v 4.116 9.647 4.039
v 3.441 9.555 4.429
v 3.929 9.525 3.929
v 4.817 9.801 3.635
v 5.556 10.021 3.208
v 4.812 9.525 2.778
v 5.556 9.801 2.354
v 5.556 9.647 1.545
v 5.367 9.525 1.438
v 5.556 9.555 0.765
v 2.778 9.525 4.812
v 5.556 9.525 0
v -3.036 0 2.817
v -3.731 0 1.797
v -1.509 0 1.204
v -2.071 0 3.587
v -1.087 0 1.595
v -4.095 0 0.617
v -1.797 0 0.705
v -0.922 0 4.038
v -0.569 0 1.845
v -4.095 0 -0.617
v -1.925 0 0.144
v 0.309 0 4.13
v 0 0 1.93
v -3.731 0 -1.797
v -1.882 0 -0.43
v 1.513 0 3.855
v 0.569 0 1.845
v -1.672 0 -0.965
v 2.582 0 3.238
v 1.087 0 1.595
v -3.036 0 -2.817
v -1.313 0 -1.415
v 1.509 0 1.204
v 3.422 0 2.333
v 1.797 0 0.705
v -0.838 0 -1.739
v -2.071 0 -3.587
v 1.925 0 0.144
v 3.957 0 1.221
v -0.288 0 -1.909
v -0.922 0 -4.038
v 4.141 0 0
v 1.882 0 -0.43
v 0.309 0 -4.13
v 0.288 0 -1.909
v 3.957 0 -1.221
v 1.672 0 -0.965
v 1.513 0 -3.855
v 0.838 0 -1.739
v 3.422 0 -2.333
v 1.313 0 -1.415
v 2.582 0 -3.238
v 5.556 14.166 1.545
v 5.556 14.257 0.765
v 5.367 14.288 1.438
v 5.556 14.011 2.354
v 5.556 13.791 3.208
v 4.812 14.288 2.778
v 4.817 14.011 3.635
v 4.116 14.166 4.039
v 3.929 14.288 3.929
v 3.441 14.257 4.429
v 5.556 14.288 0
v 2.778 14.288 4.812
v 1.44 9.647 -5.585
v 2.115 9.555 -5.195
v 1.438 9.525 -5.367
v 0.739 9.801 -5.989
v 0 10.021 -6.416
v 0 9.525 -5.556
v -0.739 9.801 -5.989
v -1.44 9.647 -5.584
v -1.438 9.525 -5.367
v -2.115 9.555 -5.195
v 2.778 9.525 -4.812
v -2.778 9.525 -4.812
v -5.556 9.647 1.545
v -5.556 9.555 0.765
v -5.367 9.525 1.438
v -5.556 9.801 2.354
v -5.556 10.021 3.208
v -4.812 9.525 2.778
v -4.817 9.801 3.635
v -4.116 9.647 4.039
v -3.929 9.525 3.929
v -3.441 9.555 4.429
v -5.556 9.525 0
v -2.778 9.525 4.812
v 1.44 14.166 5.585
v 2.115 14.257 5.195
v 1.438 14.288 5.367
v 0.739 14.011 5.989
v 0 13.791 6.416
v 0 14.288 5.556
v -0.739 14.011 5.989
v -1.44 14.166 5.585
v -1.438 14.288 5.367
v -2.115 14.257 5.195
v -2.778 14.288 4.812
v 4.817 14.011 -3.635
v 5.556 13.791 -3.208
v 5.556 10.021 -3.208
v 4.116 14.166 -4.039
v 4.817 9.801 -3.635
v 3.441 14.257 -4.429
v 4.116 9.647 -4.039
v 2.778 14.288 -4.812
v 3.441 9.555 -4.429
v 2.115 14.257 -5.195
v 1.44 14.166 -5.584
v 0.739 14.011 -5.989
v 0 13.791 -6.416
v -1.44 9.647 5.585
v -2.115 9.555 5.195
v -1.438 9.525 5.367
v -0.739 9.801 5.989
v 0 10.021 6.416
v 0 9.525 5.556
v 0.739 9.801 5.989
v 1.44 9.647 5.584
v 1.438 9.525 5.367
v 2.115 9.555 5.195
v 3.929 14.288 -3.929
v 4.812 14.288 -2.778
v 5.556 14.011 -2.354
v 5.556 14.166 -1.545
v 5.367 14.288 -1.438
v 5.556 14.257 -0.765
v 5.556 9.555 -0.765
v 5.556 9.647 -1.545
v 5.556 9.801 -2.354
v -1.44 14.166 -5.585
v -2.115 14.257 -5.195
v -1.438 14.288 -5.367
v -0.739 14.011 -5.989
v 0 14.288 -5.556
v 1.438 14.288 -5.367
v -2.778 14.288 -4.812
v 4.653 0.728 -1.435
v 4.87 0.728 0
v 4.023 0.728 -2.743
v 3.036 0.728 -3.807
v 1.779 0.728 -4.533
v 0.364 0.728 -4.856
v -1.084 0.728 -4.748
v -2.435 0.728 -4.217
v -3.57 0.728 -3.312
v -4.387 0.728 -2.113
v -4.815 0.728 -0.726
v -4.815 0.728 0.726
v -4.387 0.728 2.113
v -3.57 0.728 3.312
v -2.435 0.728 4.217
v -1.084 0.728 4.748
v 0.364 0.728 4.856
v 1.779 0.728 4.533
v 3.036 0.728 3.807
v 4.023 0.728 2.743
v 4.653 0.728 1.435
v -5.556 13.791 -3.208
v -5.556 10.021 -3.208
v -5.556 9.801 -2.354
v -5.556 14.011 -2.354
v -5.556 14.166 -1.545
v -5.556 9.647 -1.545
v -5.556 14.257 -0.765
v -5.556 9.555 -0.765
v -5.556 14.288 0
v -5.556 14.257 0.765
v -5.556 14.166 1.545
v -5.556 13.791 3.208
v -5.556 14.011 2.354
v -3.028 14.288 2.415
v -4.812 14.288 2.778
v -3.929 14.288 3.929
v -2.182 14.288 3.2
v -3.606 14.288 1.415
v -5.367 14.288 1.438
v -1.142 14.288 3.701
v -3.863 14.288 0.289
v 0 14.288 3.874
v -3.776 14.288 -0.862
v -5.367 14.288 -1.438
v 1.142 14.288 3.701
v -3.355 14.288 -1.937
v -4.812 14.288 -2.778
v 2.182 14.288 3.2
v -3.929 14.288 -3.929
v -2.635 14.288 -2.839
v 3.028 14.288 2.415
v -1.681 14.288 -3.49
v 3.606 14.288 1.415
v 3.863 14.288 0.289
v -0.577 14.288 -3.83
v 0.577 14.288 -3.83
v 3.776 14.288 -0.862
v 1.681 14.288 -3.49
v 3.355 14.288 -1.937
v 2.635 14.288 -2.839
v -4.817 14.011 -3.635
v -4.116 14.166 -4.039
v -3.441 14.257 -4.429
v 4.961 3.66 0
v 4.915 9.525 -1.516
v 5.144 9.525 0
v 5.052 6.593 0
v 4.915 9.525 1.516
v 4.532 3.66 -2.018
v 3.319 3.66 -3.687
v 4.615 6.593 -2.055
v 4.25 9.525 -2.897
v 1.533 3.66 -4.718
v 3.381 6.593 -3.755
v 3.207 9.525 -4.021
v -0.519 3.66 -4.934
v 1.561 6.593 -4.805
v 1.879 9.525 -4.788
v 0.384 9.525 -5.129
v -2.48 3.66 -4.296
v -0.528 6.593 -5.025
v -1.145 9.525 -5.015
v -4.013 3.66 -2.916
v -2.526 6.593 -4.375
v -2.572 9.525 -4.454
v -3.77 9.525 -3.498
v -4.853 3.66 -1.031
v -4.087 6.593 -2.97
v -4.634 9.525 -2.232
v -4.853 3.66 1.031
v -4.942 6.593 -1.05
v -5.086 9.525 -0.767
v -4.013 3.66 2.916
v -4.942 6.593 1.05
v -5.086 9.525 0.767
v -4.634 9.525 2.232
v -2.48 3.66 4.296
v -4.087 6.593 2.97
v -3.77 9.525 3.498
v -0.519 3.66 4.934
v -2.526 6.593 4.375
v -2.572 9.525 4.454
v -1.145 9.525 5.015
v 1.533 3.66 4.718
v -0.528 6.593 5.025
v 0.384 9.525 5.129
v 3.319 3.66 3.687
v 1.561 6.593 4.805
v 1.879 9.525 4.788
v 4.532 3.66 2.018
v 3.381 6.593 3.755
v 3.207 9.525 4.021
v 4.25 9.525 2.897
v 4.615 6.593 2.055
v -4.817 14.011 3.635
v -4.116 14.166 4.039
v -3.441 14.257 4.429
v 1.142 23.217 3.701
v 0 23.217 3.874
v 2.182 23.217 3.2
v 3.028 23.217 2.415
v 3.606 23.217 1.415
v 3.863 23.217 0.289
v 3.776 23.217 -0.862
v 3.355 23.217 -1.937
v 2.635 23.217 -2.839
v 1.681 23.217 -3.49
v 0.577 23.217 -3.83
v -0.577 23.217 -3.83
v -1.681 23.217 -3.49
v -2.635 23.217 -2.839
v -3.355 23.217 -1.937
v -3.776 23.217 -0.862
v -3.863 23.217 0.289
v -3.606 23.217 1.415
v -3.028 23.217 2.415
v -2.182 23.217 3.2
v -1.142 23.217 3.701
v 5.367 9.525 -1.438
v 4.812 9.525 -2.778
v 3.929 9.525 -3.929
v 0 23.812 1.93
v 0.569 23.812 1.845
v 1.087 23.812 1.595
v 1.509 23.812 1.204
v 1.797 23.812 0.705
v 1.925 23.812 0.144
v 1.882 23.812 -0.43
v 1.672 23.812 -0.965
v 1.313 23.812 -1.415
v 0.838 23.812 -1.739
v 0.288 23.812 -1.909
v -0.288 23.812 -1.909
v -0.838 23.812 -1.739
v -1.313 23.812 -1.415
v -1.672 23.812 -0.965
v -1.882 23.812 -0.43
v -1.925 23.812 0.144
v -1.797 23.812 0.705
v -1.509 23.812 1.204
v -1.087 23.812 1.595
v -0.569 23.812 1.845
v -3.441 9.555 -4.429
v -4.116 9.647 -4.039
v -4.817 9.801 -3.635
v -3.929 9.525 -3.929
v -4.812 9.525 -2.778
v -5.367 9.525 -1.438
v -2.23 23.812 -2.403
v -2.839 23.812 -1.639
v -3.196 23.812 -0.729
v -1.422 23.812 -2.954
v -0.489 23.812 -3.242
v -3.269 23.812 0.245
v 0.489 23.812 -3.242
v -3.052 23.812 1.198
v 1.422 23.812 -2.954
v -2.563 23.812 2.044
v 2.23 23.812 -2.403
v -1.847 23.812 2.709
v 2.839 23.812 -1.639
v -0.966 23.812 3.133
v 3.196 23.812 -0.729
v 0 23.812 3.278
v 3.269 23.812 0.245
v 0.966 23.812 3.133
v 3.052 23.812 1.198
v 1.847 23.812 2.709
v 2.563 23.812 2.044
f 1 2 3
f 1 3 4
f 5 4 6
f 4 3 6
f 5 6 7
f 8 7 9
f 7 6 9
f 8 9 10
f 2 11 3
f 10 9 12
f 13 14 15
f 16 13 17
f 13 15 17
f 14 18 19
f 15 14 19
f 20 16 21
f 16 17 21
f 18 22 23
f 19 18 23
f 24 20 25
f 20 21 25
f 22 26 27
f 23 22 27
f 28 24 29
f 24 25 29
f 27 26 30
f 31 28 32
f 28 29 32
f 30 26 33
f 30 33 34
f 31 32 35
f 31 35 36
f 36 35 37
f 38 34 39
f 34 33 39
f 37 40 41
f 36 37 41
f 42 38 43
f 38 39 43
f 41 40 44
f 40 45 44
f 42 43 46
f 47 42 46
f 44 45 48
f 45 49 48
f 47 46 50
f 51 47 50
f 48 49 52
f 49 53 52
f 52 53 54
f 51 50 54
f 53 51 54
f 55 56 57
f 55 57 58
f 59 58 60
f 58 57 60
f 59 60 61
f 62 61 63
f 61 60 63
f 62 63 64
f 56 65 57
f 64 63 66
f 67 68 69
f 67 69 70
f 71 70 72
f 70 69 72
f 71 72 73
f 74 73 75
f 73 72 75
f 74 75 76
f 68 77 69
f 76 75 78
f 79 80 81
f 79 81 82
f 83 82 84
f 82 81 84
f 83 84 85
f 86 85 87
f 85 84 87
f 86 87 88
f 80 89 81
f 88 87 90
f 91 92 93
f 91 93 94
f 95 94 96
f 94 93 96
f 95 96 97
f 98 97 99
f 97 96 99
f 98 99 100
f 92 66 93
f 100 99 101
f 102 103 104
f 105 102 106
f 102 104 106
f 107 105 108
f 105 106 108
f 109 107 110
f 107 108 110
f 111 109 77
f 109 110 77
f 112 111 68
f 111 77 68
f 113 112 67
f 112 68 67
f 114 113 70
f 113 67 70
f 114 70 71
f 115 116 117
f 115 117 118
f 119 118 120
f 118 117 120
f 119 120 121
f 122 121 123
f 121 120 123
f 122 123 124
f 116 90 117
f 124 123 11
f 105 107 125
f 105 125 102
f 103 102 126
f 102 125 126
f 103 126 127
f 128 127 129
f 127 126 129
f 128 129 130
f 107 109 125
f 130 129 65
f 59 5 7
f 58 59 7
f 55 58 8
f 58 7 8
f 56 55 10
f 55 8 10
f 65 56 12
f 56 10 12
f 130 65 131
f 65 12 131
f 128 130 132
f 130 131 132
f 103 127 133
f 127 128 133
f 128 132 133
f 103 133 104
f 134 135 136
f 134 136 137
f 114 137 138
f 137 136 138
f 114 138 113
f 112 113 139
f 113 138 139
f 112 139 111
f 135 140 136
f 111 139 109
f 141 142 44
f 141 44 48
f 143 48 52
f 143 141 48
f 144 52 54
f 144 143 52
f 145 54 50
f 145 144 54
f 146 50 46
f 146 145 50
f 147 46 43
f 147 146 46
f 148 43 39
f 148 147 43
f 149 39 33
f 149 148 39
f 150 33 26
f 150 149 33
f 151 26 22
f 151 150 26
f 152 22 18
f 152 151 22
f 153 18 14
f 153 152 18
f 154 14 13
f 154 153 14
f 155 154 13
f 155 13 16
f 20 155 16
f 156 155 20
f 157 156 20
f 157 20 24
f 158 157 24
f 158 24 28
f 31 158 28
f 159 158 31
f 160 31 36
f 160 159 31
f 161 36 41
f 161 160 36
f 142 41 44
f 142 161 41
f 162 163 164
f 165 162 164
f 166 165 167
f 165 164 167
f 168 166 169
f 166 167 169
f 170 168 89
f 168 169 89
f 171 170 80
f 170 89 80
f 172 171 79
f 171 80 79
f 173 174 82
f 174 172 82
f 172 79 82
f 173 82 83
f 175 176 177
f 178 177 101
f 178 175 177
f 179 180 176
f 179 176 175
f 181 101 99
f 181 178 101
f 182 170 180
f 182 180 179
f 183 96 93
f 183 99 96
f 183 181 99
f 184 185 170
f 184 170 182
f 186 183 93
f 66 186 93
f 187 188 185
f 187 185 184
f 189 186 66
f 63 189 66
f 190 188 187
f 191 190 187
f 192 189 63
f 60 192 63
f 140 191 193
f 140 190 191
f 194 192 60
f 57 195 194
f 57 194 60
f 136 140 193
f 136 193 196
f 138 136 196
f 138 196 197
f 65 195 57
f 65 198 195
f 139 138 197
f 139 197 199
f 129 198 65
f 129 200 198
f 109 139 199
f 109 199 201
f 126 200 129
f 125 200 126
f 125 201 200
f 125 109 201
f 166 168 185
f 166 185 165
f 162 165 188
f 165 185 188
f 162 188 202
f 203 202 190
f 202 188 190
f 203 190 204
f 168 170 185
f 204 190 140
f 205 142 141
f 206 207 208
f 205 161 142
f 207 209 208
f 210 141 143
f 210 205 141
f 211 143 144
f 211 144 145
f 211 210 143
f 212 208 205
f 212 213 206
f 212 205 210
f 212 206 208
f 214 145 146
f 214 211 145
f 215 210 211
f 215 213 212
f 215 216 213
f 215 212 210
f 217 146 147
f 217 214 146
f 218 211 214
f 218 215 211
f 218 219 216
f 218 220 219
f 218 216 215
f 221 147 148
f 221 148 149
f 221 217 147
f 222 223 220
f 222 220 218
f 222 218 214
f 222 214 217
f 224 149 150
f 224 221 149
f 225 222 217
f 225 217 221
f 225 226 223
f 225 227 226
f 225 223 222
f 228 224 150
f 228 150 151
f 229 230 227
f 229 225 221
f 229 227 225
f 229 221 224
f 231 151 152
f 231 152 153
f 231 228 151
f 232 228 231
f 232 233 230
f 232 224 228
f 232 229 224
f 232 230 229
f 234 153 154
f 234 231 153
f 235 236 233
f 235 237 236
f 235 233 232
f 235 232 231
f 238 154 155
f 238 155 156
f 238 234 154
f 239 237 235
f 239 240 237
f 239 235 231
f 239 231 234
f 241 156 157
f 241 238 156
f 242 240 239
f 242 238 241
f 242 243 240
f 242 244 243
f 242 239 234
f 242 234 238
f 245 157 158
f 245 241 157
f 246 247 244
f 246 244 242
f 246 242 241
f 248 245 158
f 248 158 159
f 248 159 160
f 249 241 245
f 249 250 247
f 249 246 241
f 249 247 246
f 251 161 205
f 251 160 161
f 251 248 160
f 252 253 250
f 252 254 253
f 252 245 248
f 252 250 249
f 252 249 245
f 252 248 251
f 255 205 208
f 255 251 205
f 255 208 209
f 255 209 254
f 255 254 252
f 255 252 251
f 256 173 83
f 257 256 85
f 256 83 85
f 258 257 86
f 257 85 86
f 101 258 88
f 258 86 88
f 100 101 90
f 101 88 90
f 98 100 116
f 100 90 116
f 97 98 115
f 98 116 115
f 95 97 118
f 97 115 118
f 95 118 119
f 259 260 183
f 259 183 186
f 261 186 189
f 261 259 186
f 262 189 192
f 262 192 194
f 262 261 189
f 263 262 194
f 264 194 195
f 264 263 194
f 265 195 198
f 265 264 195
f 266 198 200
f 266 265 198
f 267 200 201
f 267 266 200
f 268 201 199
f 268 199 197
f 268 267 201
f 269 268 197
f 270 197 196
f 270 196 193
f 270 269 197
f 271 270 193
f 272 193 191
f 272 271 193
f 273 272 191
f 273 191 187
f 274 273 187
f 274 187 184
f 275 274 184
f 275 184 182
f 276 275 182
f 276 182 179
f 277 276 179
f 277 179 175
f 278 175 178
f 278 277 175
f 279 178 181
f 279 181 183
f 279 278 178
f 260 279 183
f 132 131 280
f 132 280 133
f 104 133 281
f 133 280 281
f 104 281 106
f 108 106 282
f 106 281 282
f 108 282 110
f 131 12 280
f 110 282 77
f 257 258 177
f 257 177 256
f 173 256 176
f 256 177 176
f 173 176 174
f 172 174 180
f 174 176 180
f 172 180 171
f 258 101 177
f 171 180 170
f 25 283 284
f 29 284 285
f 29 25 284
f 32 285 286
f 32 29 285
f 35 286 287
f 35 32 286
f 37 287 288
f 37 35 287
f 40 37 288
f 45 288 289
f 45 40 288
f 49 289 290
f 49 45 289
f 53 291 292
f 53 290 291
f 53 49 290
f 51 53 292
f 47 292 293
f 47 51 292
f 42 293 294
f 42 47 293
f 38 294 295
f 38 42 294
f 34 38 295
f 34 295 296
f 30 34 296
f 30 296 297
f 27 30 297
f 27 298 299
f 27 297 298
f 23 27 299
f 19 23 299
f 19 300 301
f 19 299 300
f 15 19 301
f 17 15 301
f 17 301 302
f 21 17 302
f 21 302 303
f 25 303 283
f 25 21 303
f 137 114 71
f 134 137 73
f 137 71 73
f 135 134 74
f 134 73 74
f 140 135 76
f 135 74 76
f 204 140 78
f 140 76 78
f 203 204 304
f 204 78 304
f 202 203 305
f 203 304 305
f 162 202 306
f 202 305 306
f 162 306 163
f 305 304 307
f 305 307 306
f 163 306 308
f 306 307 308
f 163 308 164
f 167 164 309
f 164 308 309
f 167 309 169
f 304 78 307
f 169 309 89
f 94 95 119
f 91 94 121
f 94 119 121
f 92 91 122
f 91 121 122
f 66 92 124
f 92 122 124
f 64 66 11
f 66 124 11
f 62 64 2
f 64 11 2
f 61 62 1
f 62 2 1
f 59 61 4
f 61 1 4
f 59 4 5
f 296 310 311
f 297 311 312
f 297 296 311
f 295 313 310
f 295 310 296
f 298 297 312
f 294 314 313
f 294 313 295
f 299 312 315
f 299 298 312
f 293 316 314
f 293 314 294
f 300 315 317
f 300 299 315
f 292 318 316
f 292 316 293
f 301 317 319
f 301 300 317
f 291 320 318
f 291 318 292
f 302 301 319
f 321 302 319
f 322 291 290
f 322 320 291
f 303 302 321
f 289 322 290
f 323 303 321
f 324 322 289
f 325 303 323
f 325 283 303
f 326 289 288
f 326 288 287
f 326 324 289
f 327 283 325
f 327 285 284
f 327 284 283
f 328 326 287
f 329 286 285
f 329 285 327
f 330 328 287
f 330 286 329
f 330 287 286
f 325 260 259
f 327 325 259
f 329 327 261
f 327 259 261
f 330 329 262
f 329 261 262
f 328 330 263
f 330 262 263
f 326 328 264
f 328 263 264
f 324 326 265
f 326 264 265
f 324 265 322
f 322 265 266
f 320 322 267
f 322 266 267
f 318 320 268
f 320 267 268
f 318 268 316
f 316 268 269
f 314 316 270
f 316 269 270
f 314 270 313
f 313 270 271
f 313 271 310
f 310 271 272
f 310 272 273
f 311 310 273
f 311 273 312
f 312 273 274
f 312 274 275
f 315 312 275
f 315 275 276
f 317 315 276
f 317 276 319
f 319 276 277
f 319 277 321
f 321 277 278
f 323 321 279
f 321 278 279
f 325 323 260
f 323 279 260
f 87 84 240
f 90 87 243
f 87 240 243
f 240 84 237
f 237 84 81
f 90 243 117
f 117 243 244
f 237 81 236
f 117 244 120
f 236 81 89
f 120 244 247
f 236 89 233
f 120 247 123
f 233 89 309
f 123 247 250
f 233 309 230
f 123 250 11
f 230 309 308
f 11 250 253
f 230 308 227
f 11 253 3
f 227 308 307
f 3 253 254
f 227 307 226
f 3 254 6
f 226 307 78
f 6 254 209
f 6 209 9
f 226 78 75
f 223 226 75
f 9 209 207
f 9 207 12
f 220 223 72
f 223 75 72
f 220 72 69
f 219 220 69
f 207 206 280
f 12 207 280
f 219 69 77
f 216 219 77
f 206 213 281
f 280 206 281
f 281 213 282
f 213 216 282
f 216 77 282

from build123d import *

# Parameters (mm, degrees)
SKETCH7_R               = 5.1435
BOSS_EXTRUDE3_DEPTH     = 9.525
BOSS_EXTRUDE3_DRAFT     = -1.783333333
BOSS_EXTRUDE4_DEPTH     = 4.7625
SKETCH9_R               = 3.8735
BOSS_EXTRUDE5_DEPTH     = 9.525
SKETCH10_R              = 1.9304
CUT_EXTRUDE1_DEPTH      = 26.279826392
SKETCH11_OUTSIDE_W      = 79.992
SKETCH11_OUTSIDE_H      = 81.712
SKETCH11_OUTSIDE_R      = 5.55625
CUT_EXTRUDE2_DEPTH      = 17.618276758
CUT_EXTRUDE2_DRAFT      = 60
MIRROR1_COPY_1_SKETCH_W = 79.992
MIRROR1_COPY_1_SKETCH_H = 81.712
MIRROR1_COPY_1_SKETCH_R = 5.55625
MIRROR1_COPY_1_DEPTH    = 17.618276758
MIRROR1_COPY_1_DRAFT    = 60
CHAMFER1_SIZE           = 0.705555556
CHAMFER1_SIZE2          = 0.728581919
CHAMFER2_SIZE           = 0.5953125


with BuildPart() as part:
    # Sketch7 → Boss-Extrude3 (with draft: the straight prism first)
    with BuildSketch(Plane(origin=(0, 9.525, 0), x_dir=(1, 0, 0), z_dir=(0, 1, 0))):
        Circle(SKETCH7_R)
    extrude(amount=-BOSS_EXTRUDE3_DEPTH)
    # Boss-Extrude3: the draft: its side faces are tilted about the plane it starts from
    boss_extrude3_sides = [part.faces().sort_by_distance(p)[0] for p in [
        (-5.1435, 4.7625, 0),
    ]]
    draft(boss_extrude3_sides, Plane(origin=(0, 9.525, 0), x_dir=(1, 0, 0), z_dir=(0, 1, 0)), BOSS_EXTRUDE3_DRAFT)

    # Sketch8 → Boss-Extrude4 (add)
    with BuildSketch(Plane(origin=(0, 9.525, 0), x_dir=(1, 0, 0), z_dir=(0, 1, 0))):
        Polygon((5.55625, -3.207902433), (5.55625, 3.207902433), (0, 6.415804866), (-5.55625, 3.207902433), (-5.55625, -3.207902433), (0, -6.415804866), align=None)
    extrude(amount=BOSS_EXTRUDE4_DEPTH)

    # Sketch9 → Boss-Extrude5 (add)
    with BuildSketch(Plane(origin=(0, 23.8125, 0), x_dir=(1, 0, 0), z_dir=(0, 1, 0))):
        with Locations(Location((0, 0, 0), (0, 0, 270))):
            Circle(SKETCH9_R)
    extrude(amount=-BOSS_EXTRUDE5_DEPTH)

    # Sketch10 → Cut-Extrude1 (cut, through all)
    with BuildSketch(Plane(origin=(0, 0, 0), x_dir=(1, 0, 0), z_dir=(0, 1, 0))):
        with Locations(Location((0, 0, 0), (0, 0, 270))):
            Circle(SKETCH10_R)
    extrude(amount=CUT_EXTRUDE1_DEPTH, mode=Mode.SUBTRACT)


with BuildPart() as cut_extrude2_tool:
    # Sketch11 outside → Cut-Extrude2 (with draft: the straight prism first)
    with BuildSketch(Plane(origin=(0, 9.525, 0), x_dir=(1, 0, 0), z_dir=(0, 1, 0))):
        Rectangle(SKETCH11_OUTSIDE_W, SKETCH11_OUTSIDE_H)
        Circle(SKETCH11_OUTSIDE_R, mode=Mode.SUBTRACT)
    extrude(amount=CUT_EXTRUDE2_DEPTH)
    # Cut-Extrude2: the draft: its side faces are tilted about the plane it starts from
    cut_extrude2_sides = [cut_extrude2_tool.faces().sort_by_distance(p)[0] for p in [
        (0, 18.334138379, 40.856),
        (39.996, 18.334138379, 0),
        (0, 18.334138379, -40.856),
        (-39.996, 18.334138379, 0),
        (-5.55625, 18.334138379, 0),
    ]]
    draft(cut_extrude2_sides, Plane(origin=(0, 9.525, 0), x_dir=(1, 0, 0), z_dir=(0, 1, 0)), CUT_EXTRUDE2_DRAFT)


with BuildPart() as part_1:
    add(part.part)

    # Cut-Extrude2: cut by cut_extrude2_tool
    add(cut_extrude2_tool.part, mode=Mode.SUBTRACT)


with BuildPart() as mirror1_copy_1_tool:
    # Mirror1 copy 1 sketch → Mirror1 copy 1 (with draft: the straight prism first)
    with BuildSketch(Plane.XZ.offset(-14.2875)):
        Rectangle(MIRROR1_COPY_1_SKETCH_W, MIRROR1_COPY_1_SKETCH_H)
        Circle(MIRROR1_COPY_1_SKETCH_R, mode=Mode.SUBTRACT)
    extrude(amount=MIRROR1_COPY_1_DEPTH)
    # Mirror1 copy 1: the draft: its side faces are tilted about the plane it starts from
    mirror1_copy_1_sides = [mirror1_copy_1_tool.faces().sort_by_distance(p)[0] for p in [
        (0, 5.478361621, 40.856),
        (39.996, 5.478361621, 0),
        (0, 5.478361621, -40.856),
        (-39.996, 5.478361621, 0),
        (-5.55625, 5.478361621, 0),
    ]]
    draft(mirror1_copy_1_sides, Plane.XZ.offset(-14.2875), MIRROR1_COPY_1_DRAFT)


with BuildPart() as part_2:
    add(part_1.part)

    # Mirror1 copy 1: cut by mirror1_copy_1_tool
    add(mirror1_copy_1_tool.part, mode=Mode.SUBTRACT)

    # Chamfer1
    chamfer1_edges = [part_2.edges().sort_by_distance(p)[0] for p in [
        (-4.846938237, 0, 0),
    ]]
    chamfer1_side = [part_2.faces().sort_by_distance(p)[0] for p in [
        (-4.709846121, 0, 0),
    ]]
    chamfer(chamfer1_edges, length=CHAMFER1_SIZE, length2=CHAMFER1_SIZE2, reference=chamfer1_side[0])

    # Chamfer2
    chamfer2_edges = [part_2.edges().sort_by_distance(p)[0] for p in [
        (0, 23.8125, -3.8735),
    ]]
    chamfer(chamfer2_edges, length=CHAMFER2_SIZE)


solid = part_2.part
